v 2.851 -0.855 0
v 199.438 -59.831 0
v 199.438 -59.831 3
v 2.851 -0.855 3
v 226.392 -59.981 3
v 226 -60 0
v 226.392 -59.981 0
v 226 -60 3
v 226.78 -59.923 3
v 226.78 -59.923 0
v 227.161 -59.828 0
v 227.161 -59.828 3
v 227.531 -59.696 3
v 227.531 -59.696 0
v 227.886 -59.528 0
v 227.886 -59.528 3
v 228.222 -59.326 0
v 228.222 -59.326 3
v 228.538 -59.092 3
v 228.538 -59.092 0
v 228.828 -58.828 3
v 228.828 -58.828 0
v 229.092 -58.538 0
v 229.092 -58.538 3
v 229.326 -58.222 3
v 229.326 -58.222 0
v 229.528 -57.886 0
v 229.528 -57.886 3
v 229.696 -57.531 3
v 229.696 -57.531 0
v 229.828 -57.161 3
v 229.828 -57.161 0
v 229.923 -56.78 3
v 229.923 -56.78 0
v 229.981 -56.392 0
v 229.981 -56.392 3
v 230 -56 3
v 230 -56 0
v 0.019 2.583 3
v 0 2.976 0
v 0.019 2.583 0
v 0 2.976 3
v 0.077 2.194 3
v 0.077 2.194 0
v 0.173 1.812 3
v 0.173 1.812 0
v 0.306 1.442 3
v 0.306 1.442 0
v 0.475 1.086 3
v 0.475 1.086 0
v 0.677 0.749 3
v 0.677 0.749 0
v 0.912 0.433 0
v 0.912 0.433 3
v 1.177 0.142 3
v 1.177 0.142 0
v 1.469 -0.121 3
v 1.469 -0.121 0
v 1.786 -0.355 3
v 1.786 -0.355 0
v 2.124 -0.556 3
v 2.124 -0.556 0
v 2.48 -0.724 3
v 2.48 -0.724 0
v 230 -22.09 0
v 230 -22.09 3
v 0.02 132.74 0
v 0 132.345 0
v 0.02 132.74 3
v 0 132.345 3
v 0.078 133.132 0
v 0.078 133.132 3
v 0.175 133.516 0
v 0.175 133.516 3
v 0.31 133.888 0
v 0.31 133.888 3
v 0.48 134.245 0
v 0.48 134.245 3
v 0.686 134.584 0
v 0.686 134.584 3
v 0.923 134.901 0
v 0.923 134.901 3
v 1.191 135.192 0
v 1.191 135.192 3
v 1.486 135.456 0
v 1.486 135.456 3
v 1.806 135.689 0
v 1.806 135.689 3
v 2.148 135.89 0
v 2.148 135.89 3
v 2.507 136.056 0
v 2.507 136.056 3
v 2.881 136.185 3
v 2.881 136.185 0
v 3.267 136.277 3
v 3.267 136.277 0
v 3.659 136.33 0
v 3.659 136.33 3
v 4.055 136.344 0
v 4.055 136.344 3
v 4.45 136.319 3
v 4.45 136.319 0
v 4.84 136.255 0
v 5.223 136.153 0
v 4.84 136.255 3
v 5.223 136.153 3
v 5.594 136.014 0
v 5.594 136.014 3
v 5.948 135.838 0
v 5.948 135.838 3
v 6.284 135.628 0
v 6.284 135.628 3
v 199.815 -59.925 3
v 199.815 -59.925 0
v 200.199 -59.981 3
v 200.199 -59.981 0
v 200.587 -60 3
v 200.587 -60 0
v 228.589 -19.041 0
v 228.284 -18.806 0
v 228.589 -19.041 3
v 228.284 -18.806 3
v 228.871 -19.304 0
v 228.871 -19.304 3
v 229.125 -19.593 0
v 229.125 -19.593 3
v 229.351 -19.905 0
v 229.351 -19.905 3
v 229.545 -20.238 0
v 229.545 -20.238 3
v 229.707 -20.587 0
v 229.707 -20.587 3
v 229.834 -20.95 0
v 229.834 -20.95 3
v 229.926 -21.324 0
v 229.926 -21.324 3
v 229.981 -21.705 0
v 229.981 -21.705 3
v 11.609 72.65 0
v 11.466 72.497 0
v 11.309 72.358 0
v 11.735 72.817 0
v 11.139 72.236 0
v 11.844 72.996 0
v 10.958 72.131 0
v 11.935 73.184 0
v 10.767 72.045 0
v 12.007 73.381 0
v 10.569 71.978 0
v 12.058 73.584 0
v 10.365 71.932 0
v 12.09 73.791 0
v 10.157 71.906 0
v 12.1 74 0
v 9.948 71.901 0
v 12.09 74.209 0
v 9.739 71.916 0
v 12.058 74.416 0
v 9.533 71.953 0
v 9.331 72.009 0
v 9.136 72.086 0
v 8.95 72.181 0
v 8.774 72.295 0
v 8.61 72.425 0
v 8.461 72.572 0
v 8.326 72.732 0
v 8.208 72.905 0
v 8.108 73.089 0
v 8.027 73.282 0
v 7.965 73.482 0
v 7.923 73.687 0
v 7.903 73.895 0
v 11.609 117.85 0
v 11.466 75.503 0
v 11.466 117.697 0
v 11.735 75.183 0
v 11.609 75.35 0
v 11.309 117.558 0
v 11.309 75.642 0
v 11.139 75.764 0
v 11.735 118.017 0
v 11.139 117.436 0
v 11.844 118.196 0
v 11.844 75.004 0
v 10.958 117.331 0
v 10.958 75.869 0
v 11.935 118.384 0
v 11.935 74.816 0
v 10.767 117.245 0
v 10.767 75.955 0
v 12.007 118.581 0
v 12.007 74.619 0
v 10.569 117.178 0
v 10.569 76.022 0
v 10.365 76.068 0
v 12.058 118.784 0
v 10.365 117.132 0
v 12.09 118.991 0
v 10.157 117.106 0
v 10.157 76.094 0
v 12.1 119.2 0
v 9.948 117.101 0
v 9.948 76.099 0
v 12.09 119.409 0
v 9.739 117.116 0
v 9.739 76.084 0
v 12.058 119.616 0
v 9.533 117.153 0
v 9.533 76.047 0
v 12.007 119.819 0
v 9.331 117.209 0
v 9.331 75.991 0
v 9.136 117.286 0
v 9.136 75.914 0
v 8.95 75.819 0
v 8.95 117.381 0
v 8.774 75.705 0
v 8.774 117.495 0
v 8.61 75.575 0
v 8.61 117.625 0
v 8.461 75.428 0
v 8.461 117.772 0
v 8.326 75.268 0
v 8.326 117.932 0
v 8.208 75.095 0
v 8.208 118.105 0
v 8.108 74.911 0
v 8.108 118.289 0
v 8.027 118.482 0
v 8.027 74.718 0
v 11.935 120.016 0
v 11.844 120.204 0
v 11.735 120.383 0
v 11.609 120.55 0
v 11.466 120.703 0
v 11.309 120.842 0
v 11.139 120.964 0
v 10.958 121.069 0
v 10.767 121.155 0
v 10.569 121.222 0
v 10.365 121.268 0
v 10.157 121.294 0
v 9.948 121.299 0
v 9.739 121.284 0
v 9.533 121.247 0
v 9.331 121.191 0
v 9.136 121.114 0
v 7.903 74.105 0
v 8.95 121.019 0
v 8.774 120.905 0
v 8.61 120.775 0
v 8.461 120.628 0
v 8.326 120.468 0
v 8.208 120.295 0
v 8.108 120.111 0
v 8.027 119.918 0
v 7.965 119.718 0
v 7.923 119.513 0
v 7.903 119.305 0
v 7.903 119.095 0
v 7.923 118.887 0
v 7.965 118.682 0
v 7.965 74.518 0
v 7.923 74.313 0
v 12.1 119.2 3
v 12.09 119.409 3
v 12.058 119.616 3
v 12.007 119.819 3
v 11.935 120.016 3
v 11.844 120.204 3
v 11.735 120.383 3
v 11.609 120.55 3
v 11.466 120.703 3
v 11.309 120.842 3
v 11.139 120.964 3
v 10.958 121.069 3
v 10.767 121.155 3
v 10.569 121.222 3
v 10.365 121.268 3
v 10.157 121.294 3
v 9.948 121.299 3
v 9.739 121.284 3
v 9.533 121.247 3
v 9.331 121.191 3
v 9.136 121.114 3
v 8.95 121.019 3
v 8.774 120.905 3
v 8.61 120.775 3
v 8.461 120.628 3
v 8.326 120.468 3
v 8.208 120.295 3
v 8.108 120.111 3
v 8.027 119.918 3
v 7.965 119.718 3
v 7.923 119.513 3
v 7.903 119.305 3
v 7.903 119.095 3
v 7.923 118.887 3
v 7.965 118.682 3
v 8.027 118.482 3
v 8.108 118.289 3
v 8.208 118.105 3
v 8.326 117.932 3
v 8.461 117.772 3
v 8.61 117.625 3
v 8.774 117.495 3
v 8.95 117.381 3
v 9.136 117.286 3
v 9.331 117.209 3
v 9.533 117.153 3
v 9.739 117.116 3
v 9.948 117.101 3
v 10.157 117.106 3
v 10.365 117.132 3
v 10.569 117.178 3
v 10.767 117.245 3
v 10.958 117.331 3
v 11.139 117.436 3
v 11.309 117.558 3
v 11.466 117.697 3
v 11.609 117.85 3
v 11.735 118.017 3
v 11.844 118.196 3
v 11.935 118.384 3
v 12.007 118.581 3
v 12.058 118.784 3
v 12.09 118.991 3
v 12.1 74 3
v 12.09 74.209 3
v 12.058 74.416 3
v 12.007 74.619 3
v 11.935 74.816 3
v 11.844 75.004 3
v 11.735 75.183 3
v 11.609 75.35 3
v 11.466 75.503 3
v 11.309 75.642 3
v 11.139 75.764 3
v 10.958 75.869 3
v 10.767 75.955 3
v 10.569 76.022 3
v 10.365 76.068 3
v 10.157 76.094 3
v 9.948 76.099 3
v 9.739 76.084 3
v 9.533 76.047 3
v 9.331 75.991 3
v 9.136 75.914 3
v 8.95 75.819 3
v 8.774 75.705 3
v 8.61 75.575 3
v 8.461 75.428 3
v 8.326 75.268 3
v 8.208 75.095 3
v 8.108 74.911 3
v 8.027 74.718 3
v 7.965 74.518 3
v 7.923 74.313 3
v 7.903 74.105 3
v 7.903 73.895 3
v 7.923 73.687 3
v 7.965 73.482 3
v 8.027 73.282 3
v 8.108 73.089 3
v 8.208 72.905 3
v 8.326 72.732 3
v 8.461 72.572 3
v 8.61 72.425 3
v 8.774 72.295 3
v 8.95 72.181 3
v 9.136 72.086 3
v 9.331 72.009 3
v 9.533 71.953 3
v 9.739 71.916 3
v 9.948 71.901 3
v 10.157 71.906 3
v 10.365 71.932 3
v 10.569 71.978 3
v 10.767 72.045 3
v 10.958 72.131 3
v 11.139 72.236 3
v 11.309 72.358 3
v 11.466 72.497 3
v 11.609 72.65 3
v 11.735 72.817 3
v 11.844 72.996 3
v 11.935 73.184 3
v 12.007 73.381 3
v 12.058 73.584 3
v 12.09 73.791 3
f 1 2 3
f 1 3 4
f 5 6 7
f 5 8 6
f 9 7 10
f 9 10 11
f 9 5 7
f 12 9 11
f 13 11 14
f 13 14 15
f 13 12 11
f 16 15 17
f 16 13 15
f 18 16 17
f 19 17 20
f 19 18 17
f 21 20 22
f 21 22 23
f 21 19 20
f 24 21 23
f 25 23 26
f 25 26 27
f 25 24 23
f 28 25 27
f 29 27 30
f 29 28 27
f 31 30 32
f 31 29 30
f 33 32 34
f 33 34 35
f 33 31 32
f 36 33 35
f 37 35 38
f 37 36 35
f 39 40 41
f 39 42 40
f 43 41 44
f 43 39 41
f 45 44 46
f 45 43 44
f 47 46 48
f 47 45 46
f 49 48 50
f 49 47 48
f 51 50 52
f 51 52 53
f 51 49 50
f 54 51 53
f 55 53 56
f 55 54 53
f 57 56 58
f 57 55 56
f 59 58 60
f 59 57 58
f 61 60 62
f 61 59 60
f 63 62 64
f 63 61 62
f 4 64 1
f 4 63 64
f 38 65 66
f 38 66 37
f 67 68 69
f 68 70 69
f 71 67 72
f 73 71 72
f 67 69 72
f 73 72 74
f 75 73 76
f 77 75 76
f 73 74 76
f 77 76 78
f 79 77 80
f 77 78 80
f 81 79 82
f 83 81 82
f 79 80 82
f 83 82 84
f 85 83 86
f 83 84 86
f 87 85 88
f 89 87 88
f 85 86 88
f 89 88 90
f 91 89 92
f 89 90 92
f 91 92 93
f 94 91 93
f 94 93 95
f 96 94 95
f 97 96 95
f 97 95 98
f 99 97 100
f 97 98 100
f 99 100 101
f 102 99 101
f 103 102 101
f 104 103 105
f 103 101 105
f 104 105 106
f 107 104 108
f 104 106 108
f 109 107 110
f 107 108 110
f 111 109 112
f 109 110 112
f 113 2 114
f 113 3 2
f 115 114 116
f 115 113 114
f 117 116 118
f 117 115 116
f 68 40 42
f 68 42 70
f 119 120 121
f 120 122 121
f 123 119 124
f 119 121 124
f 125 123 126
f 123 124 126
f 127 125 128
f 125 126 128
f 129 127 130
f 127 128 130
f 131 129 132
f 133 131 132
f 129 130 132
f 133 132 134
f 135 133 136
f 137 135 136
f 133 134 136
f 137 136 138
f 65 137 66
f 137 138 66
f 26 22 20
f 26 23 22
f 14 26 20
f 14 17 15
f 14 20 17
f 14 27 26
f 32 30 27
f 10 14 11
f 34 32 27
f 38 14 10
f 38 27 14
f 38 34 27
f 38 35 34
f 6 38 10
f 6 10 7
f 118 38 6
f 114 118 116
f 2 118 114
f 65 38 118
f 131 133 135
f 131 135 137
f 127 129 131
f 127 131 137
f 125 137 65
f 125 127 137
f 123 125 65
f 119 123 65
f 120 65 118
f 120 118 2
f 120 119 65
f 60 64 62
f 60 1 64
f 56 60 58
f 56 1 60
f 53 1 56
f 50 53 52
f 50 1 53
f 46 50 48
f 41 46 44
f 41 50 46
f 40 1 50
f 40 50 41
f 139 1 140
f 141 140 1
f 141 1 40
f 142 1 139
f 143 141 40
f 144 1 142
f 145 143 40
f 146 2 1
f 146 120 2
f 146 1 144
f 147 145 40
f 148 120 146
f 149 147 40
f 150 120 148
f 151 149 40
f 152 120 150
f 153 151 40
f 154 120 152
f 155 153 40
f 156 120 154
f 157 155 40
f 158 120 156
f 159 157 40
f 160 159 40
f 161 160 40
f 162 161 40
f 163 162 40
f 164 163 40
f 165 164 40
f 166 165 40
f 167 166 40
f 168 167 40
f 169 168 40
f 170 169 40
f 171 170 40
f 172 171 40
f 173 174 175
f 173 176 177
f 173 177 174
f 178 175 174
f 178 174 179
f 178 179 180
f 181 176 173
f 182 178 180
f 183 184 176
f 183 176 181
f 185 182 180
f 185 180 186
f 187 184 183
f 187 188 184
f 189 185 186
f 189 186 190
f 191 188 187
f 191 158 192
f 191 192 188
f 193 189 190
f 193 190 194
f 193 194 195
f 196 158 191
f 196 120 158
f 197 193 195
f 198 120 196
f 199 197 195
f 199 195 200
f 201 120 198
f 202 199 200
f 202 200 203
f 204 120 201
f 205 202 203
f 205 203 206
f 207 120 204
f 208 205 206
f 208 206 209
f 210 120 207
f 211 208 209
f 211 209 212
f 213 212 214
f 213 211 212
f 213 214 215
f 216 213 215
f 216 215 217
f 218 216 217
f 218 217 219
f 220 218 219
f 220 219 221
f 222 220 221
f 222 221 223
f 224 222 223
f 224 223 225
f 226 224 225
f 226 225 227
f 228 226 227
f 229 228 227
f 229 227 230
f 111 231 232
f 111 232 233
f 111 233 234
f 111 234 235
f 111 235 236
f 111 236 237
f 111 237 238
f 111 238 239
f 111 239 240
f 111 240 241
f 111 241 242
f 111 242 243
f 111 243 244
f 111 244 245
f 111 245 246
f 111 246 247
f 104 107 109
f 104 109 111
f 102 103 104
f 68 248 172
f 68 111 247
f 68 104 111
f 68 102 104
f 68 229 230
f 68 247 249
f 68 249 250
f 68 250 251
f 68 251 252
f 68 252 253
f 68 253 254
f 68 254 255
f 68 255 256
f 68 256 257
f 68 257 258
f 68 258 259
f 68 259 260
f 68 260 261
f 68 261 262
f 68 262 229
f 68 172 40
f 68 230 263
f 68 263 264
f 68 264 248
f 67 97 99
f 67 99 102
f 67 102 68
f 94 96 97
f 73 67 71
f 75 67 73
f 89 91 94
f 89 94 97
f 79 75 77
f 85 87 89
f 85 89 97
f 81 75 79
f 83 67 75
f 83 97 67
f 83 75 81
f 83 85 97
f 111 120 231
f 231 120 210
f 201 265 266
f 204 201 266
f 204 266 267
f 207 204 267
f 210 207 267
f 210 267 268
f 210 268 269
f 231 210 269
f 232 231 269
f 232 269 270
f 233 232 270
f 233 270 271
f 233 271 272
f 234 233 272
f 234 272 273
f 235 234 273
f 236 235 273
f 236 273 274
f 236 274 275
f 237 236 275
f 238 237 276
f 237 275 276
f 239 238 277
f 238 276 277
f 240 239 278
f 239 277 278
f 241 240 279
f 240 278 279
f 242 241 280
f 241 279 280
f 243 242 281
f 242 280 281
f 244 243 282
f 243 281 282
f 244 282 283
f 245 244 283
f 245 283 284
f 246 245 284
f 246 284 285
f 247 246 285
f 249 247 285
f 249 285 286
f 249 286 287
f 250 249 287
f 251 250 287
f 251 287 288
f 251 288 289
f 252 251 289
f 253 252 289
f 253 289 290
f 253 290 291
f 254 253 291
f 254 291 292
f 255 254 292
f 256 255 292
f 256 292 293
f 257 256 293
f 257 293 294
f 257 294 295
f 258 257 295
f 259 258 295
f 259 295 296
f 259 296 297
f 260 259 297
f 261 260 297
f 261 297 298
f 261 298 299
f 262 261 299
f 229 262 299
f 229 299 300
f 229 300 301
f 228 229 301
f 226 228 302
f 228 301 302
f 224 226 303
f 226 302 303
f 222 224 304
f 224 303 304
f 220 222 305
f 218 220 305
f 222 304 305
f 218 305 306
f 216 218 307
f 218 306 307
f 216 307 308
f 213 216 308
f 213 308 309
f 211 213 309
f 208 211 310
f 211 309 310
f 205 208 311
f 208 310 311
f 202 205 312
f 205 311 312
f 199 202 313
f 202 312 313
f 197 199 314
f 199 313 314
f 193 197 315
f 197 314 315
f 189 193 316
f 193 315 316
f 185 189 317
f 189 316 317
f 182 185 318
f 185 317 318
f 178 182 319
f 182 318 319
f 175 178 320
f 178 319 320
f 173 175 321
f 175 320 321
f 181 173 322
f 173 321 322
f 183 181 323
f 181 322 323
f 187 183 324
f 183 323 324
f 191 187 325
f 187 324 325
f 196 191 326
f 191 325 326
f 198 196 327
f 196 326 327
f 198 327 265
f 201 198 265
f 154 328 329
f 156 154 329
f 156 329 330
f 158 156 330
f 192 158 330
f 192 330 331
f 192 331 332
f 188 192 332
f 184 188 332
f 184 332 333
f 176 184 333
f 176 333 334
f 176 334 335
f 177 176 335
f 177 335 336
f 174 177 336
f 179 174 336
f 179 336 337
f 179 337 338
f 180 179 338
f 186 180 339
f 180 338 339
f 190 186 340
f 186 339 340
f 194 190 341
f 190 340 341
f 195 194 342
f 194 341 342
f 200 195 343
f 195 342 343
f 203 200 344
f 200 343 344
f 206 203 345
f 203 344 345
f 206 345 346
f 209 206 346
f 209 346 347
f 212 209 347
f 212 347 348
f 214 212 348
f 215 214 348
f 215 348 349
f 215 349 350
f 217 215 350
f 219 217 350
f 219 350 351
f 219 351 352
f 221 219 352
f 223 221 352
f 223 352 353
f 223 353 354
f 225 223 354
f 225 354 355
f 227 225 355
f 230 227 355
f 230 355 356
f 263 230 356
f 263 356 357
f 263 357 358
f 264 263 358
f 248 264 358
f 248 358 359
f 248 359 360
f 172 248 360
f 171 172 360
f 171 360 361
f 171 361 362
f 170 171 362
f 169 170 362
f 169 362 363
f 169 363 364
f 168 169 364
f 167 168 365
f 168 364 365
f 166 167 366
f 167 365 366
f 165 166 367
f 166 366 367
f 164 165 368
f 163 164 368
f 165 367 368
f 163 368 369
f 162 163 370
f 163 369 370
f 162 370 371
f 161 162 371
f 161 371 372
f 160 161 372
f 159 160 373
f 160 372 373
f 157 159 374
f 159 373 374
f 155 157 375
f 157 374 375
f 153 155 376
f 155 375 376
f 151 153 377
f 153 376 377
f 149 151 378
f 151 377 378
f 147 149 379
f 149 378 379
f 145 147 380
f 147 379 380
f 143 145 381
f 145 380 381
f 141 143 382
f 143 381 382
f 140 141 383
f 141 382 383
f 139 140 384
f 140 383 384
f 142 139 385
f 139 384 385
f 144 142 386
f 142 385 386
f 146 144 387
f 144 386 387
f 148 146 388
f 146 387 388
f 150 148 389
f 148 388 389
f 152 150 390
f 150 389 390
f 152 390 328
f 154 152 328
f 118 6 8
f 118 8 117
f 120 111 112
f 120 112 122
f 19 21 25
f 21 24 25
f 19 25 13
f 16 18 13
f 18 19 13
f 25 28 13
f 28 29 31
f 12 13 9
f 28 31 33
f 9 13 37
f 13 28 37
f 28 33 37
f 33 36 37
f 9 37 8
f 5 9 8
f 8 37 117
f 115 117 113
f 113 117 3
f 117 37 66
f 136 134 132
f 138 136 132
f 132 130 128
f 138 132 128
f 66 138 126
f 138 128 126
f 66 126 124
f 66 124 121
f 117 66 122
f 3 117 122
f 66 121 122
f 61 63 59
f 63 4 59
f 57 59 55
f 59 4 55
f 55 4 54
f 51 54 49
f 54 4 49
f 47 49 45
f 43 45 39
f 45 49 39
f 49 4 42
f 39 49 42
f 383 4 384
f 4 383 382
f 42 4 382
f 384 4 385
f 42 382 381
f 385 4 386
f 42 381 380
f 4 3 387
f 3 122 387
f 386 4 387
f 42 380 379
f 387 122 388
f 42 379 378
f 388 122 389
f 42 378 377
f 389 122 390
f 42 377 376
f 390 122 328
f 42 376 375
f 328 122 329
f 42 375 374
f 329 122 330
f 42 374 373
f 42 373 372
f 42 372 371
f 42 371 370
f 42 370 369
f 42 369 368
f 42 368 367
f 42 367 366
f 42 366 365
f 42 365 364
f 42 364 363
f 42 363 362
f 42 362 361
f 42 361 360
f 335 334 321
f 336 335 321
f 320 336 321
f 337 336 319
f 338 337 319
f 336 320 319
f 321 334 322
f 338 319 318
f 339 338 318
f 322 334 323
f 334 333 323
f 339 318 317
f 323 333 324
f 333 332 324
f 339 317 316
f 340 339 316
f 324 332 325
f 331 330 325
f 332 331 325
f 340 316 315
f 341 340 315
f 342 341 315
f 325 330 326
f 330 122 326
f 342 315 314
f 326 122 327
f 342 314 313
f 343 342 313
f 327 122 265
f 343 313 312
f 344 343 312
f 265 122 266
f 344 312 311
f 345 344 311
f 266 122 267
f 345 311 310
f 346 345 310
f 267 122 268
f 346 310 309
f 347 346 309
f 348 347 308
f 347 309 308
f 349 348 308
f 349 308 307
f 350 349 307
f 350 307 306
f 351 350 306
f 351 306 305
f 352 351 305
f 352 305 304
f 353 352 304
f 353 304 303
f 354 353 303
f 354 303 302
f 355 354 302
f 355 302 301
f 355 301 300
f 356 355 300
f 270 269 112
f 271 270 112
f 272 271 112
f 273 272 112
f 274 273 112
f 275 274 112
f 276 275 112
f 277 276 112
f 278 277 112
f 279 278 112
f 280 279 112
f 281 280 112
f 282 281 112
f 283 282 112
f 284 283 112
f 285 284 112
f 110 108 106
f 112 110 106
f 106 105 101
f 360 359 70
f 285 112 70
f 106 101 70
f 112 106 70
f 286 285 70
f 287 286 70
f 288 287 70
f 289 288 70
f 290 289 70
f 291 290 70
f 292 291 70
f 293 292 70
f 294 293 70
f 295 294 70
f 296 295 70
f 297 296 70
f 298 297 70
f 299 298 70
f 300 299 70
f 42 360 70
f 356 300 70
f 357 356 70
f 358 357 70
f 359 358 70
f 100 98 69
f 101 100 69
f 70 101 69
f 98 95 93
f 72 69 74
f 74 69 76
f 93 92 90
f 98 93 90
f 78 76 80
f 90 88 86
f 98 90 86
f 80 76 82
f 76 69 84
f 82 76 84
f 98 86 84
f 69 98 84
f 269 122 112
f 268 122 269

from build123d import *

# Parameters (mm, degrees)
EXTRUDE_1_DEPTH     = 3
SKETCH_2_R          = 2.1
CUT_EXTRUDE_1_DEPTH = 39
FILLET_1_R          = 4


with BuildPart() as part:
    # Эскиз1 → Бобышка-Вытянуть1 (new body)
    with BuildSketch(Plane.XY):
        Polygon((0, 0), (0, 140), (230, -20), (230, -60), (200, -60), align=None)
    extrude(amount=EXTRUDE_1_DEPTH)

    # Эскиз2 → Вырез-Вытянуть1 (cut)
    with BuildSketch(Plane.XY.offset(3)):
        with Locations((10, 74)):
            Circle(SKETCH_2_R)
        with Locations((10, 119.2)):
            Circle(SKETCH_2_R)
    extrude(amount=-CUT_EXTRUDE_1_DEPTH, mode=Mode.SUBTRACT)

    # Скругление1
    fillet_1_edges = [part.edges().sort_by_distance(p)[0] for p in [
        (0, 0, 1.5),
        (0, 140, 1.5),
        (230, -20, 1.5),
        (230, -60, 1.5),
        (200, -60, 1.5),
    ]]
    fillet(fillet_1_edges, radius=FILLET_1_R)


solid = part.part
